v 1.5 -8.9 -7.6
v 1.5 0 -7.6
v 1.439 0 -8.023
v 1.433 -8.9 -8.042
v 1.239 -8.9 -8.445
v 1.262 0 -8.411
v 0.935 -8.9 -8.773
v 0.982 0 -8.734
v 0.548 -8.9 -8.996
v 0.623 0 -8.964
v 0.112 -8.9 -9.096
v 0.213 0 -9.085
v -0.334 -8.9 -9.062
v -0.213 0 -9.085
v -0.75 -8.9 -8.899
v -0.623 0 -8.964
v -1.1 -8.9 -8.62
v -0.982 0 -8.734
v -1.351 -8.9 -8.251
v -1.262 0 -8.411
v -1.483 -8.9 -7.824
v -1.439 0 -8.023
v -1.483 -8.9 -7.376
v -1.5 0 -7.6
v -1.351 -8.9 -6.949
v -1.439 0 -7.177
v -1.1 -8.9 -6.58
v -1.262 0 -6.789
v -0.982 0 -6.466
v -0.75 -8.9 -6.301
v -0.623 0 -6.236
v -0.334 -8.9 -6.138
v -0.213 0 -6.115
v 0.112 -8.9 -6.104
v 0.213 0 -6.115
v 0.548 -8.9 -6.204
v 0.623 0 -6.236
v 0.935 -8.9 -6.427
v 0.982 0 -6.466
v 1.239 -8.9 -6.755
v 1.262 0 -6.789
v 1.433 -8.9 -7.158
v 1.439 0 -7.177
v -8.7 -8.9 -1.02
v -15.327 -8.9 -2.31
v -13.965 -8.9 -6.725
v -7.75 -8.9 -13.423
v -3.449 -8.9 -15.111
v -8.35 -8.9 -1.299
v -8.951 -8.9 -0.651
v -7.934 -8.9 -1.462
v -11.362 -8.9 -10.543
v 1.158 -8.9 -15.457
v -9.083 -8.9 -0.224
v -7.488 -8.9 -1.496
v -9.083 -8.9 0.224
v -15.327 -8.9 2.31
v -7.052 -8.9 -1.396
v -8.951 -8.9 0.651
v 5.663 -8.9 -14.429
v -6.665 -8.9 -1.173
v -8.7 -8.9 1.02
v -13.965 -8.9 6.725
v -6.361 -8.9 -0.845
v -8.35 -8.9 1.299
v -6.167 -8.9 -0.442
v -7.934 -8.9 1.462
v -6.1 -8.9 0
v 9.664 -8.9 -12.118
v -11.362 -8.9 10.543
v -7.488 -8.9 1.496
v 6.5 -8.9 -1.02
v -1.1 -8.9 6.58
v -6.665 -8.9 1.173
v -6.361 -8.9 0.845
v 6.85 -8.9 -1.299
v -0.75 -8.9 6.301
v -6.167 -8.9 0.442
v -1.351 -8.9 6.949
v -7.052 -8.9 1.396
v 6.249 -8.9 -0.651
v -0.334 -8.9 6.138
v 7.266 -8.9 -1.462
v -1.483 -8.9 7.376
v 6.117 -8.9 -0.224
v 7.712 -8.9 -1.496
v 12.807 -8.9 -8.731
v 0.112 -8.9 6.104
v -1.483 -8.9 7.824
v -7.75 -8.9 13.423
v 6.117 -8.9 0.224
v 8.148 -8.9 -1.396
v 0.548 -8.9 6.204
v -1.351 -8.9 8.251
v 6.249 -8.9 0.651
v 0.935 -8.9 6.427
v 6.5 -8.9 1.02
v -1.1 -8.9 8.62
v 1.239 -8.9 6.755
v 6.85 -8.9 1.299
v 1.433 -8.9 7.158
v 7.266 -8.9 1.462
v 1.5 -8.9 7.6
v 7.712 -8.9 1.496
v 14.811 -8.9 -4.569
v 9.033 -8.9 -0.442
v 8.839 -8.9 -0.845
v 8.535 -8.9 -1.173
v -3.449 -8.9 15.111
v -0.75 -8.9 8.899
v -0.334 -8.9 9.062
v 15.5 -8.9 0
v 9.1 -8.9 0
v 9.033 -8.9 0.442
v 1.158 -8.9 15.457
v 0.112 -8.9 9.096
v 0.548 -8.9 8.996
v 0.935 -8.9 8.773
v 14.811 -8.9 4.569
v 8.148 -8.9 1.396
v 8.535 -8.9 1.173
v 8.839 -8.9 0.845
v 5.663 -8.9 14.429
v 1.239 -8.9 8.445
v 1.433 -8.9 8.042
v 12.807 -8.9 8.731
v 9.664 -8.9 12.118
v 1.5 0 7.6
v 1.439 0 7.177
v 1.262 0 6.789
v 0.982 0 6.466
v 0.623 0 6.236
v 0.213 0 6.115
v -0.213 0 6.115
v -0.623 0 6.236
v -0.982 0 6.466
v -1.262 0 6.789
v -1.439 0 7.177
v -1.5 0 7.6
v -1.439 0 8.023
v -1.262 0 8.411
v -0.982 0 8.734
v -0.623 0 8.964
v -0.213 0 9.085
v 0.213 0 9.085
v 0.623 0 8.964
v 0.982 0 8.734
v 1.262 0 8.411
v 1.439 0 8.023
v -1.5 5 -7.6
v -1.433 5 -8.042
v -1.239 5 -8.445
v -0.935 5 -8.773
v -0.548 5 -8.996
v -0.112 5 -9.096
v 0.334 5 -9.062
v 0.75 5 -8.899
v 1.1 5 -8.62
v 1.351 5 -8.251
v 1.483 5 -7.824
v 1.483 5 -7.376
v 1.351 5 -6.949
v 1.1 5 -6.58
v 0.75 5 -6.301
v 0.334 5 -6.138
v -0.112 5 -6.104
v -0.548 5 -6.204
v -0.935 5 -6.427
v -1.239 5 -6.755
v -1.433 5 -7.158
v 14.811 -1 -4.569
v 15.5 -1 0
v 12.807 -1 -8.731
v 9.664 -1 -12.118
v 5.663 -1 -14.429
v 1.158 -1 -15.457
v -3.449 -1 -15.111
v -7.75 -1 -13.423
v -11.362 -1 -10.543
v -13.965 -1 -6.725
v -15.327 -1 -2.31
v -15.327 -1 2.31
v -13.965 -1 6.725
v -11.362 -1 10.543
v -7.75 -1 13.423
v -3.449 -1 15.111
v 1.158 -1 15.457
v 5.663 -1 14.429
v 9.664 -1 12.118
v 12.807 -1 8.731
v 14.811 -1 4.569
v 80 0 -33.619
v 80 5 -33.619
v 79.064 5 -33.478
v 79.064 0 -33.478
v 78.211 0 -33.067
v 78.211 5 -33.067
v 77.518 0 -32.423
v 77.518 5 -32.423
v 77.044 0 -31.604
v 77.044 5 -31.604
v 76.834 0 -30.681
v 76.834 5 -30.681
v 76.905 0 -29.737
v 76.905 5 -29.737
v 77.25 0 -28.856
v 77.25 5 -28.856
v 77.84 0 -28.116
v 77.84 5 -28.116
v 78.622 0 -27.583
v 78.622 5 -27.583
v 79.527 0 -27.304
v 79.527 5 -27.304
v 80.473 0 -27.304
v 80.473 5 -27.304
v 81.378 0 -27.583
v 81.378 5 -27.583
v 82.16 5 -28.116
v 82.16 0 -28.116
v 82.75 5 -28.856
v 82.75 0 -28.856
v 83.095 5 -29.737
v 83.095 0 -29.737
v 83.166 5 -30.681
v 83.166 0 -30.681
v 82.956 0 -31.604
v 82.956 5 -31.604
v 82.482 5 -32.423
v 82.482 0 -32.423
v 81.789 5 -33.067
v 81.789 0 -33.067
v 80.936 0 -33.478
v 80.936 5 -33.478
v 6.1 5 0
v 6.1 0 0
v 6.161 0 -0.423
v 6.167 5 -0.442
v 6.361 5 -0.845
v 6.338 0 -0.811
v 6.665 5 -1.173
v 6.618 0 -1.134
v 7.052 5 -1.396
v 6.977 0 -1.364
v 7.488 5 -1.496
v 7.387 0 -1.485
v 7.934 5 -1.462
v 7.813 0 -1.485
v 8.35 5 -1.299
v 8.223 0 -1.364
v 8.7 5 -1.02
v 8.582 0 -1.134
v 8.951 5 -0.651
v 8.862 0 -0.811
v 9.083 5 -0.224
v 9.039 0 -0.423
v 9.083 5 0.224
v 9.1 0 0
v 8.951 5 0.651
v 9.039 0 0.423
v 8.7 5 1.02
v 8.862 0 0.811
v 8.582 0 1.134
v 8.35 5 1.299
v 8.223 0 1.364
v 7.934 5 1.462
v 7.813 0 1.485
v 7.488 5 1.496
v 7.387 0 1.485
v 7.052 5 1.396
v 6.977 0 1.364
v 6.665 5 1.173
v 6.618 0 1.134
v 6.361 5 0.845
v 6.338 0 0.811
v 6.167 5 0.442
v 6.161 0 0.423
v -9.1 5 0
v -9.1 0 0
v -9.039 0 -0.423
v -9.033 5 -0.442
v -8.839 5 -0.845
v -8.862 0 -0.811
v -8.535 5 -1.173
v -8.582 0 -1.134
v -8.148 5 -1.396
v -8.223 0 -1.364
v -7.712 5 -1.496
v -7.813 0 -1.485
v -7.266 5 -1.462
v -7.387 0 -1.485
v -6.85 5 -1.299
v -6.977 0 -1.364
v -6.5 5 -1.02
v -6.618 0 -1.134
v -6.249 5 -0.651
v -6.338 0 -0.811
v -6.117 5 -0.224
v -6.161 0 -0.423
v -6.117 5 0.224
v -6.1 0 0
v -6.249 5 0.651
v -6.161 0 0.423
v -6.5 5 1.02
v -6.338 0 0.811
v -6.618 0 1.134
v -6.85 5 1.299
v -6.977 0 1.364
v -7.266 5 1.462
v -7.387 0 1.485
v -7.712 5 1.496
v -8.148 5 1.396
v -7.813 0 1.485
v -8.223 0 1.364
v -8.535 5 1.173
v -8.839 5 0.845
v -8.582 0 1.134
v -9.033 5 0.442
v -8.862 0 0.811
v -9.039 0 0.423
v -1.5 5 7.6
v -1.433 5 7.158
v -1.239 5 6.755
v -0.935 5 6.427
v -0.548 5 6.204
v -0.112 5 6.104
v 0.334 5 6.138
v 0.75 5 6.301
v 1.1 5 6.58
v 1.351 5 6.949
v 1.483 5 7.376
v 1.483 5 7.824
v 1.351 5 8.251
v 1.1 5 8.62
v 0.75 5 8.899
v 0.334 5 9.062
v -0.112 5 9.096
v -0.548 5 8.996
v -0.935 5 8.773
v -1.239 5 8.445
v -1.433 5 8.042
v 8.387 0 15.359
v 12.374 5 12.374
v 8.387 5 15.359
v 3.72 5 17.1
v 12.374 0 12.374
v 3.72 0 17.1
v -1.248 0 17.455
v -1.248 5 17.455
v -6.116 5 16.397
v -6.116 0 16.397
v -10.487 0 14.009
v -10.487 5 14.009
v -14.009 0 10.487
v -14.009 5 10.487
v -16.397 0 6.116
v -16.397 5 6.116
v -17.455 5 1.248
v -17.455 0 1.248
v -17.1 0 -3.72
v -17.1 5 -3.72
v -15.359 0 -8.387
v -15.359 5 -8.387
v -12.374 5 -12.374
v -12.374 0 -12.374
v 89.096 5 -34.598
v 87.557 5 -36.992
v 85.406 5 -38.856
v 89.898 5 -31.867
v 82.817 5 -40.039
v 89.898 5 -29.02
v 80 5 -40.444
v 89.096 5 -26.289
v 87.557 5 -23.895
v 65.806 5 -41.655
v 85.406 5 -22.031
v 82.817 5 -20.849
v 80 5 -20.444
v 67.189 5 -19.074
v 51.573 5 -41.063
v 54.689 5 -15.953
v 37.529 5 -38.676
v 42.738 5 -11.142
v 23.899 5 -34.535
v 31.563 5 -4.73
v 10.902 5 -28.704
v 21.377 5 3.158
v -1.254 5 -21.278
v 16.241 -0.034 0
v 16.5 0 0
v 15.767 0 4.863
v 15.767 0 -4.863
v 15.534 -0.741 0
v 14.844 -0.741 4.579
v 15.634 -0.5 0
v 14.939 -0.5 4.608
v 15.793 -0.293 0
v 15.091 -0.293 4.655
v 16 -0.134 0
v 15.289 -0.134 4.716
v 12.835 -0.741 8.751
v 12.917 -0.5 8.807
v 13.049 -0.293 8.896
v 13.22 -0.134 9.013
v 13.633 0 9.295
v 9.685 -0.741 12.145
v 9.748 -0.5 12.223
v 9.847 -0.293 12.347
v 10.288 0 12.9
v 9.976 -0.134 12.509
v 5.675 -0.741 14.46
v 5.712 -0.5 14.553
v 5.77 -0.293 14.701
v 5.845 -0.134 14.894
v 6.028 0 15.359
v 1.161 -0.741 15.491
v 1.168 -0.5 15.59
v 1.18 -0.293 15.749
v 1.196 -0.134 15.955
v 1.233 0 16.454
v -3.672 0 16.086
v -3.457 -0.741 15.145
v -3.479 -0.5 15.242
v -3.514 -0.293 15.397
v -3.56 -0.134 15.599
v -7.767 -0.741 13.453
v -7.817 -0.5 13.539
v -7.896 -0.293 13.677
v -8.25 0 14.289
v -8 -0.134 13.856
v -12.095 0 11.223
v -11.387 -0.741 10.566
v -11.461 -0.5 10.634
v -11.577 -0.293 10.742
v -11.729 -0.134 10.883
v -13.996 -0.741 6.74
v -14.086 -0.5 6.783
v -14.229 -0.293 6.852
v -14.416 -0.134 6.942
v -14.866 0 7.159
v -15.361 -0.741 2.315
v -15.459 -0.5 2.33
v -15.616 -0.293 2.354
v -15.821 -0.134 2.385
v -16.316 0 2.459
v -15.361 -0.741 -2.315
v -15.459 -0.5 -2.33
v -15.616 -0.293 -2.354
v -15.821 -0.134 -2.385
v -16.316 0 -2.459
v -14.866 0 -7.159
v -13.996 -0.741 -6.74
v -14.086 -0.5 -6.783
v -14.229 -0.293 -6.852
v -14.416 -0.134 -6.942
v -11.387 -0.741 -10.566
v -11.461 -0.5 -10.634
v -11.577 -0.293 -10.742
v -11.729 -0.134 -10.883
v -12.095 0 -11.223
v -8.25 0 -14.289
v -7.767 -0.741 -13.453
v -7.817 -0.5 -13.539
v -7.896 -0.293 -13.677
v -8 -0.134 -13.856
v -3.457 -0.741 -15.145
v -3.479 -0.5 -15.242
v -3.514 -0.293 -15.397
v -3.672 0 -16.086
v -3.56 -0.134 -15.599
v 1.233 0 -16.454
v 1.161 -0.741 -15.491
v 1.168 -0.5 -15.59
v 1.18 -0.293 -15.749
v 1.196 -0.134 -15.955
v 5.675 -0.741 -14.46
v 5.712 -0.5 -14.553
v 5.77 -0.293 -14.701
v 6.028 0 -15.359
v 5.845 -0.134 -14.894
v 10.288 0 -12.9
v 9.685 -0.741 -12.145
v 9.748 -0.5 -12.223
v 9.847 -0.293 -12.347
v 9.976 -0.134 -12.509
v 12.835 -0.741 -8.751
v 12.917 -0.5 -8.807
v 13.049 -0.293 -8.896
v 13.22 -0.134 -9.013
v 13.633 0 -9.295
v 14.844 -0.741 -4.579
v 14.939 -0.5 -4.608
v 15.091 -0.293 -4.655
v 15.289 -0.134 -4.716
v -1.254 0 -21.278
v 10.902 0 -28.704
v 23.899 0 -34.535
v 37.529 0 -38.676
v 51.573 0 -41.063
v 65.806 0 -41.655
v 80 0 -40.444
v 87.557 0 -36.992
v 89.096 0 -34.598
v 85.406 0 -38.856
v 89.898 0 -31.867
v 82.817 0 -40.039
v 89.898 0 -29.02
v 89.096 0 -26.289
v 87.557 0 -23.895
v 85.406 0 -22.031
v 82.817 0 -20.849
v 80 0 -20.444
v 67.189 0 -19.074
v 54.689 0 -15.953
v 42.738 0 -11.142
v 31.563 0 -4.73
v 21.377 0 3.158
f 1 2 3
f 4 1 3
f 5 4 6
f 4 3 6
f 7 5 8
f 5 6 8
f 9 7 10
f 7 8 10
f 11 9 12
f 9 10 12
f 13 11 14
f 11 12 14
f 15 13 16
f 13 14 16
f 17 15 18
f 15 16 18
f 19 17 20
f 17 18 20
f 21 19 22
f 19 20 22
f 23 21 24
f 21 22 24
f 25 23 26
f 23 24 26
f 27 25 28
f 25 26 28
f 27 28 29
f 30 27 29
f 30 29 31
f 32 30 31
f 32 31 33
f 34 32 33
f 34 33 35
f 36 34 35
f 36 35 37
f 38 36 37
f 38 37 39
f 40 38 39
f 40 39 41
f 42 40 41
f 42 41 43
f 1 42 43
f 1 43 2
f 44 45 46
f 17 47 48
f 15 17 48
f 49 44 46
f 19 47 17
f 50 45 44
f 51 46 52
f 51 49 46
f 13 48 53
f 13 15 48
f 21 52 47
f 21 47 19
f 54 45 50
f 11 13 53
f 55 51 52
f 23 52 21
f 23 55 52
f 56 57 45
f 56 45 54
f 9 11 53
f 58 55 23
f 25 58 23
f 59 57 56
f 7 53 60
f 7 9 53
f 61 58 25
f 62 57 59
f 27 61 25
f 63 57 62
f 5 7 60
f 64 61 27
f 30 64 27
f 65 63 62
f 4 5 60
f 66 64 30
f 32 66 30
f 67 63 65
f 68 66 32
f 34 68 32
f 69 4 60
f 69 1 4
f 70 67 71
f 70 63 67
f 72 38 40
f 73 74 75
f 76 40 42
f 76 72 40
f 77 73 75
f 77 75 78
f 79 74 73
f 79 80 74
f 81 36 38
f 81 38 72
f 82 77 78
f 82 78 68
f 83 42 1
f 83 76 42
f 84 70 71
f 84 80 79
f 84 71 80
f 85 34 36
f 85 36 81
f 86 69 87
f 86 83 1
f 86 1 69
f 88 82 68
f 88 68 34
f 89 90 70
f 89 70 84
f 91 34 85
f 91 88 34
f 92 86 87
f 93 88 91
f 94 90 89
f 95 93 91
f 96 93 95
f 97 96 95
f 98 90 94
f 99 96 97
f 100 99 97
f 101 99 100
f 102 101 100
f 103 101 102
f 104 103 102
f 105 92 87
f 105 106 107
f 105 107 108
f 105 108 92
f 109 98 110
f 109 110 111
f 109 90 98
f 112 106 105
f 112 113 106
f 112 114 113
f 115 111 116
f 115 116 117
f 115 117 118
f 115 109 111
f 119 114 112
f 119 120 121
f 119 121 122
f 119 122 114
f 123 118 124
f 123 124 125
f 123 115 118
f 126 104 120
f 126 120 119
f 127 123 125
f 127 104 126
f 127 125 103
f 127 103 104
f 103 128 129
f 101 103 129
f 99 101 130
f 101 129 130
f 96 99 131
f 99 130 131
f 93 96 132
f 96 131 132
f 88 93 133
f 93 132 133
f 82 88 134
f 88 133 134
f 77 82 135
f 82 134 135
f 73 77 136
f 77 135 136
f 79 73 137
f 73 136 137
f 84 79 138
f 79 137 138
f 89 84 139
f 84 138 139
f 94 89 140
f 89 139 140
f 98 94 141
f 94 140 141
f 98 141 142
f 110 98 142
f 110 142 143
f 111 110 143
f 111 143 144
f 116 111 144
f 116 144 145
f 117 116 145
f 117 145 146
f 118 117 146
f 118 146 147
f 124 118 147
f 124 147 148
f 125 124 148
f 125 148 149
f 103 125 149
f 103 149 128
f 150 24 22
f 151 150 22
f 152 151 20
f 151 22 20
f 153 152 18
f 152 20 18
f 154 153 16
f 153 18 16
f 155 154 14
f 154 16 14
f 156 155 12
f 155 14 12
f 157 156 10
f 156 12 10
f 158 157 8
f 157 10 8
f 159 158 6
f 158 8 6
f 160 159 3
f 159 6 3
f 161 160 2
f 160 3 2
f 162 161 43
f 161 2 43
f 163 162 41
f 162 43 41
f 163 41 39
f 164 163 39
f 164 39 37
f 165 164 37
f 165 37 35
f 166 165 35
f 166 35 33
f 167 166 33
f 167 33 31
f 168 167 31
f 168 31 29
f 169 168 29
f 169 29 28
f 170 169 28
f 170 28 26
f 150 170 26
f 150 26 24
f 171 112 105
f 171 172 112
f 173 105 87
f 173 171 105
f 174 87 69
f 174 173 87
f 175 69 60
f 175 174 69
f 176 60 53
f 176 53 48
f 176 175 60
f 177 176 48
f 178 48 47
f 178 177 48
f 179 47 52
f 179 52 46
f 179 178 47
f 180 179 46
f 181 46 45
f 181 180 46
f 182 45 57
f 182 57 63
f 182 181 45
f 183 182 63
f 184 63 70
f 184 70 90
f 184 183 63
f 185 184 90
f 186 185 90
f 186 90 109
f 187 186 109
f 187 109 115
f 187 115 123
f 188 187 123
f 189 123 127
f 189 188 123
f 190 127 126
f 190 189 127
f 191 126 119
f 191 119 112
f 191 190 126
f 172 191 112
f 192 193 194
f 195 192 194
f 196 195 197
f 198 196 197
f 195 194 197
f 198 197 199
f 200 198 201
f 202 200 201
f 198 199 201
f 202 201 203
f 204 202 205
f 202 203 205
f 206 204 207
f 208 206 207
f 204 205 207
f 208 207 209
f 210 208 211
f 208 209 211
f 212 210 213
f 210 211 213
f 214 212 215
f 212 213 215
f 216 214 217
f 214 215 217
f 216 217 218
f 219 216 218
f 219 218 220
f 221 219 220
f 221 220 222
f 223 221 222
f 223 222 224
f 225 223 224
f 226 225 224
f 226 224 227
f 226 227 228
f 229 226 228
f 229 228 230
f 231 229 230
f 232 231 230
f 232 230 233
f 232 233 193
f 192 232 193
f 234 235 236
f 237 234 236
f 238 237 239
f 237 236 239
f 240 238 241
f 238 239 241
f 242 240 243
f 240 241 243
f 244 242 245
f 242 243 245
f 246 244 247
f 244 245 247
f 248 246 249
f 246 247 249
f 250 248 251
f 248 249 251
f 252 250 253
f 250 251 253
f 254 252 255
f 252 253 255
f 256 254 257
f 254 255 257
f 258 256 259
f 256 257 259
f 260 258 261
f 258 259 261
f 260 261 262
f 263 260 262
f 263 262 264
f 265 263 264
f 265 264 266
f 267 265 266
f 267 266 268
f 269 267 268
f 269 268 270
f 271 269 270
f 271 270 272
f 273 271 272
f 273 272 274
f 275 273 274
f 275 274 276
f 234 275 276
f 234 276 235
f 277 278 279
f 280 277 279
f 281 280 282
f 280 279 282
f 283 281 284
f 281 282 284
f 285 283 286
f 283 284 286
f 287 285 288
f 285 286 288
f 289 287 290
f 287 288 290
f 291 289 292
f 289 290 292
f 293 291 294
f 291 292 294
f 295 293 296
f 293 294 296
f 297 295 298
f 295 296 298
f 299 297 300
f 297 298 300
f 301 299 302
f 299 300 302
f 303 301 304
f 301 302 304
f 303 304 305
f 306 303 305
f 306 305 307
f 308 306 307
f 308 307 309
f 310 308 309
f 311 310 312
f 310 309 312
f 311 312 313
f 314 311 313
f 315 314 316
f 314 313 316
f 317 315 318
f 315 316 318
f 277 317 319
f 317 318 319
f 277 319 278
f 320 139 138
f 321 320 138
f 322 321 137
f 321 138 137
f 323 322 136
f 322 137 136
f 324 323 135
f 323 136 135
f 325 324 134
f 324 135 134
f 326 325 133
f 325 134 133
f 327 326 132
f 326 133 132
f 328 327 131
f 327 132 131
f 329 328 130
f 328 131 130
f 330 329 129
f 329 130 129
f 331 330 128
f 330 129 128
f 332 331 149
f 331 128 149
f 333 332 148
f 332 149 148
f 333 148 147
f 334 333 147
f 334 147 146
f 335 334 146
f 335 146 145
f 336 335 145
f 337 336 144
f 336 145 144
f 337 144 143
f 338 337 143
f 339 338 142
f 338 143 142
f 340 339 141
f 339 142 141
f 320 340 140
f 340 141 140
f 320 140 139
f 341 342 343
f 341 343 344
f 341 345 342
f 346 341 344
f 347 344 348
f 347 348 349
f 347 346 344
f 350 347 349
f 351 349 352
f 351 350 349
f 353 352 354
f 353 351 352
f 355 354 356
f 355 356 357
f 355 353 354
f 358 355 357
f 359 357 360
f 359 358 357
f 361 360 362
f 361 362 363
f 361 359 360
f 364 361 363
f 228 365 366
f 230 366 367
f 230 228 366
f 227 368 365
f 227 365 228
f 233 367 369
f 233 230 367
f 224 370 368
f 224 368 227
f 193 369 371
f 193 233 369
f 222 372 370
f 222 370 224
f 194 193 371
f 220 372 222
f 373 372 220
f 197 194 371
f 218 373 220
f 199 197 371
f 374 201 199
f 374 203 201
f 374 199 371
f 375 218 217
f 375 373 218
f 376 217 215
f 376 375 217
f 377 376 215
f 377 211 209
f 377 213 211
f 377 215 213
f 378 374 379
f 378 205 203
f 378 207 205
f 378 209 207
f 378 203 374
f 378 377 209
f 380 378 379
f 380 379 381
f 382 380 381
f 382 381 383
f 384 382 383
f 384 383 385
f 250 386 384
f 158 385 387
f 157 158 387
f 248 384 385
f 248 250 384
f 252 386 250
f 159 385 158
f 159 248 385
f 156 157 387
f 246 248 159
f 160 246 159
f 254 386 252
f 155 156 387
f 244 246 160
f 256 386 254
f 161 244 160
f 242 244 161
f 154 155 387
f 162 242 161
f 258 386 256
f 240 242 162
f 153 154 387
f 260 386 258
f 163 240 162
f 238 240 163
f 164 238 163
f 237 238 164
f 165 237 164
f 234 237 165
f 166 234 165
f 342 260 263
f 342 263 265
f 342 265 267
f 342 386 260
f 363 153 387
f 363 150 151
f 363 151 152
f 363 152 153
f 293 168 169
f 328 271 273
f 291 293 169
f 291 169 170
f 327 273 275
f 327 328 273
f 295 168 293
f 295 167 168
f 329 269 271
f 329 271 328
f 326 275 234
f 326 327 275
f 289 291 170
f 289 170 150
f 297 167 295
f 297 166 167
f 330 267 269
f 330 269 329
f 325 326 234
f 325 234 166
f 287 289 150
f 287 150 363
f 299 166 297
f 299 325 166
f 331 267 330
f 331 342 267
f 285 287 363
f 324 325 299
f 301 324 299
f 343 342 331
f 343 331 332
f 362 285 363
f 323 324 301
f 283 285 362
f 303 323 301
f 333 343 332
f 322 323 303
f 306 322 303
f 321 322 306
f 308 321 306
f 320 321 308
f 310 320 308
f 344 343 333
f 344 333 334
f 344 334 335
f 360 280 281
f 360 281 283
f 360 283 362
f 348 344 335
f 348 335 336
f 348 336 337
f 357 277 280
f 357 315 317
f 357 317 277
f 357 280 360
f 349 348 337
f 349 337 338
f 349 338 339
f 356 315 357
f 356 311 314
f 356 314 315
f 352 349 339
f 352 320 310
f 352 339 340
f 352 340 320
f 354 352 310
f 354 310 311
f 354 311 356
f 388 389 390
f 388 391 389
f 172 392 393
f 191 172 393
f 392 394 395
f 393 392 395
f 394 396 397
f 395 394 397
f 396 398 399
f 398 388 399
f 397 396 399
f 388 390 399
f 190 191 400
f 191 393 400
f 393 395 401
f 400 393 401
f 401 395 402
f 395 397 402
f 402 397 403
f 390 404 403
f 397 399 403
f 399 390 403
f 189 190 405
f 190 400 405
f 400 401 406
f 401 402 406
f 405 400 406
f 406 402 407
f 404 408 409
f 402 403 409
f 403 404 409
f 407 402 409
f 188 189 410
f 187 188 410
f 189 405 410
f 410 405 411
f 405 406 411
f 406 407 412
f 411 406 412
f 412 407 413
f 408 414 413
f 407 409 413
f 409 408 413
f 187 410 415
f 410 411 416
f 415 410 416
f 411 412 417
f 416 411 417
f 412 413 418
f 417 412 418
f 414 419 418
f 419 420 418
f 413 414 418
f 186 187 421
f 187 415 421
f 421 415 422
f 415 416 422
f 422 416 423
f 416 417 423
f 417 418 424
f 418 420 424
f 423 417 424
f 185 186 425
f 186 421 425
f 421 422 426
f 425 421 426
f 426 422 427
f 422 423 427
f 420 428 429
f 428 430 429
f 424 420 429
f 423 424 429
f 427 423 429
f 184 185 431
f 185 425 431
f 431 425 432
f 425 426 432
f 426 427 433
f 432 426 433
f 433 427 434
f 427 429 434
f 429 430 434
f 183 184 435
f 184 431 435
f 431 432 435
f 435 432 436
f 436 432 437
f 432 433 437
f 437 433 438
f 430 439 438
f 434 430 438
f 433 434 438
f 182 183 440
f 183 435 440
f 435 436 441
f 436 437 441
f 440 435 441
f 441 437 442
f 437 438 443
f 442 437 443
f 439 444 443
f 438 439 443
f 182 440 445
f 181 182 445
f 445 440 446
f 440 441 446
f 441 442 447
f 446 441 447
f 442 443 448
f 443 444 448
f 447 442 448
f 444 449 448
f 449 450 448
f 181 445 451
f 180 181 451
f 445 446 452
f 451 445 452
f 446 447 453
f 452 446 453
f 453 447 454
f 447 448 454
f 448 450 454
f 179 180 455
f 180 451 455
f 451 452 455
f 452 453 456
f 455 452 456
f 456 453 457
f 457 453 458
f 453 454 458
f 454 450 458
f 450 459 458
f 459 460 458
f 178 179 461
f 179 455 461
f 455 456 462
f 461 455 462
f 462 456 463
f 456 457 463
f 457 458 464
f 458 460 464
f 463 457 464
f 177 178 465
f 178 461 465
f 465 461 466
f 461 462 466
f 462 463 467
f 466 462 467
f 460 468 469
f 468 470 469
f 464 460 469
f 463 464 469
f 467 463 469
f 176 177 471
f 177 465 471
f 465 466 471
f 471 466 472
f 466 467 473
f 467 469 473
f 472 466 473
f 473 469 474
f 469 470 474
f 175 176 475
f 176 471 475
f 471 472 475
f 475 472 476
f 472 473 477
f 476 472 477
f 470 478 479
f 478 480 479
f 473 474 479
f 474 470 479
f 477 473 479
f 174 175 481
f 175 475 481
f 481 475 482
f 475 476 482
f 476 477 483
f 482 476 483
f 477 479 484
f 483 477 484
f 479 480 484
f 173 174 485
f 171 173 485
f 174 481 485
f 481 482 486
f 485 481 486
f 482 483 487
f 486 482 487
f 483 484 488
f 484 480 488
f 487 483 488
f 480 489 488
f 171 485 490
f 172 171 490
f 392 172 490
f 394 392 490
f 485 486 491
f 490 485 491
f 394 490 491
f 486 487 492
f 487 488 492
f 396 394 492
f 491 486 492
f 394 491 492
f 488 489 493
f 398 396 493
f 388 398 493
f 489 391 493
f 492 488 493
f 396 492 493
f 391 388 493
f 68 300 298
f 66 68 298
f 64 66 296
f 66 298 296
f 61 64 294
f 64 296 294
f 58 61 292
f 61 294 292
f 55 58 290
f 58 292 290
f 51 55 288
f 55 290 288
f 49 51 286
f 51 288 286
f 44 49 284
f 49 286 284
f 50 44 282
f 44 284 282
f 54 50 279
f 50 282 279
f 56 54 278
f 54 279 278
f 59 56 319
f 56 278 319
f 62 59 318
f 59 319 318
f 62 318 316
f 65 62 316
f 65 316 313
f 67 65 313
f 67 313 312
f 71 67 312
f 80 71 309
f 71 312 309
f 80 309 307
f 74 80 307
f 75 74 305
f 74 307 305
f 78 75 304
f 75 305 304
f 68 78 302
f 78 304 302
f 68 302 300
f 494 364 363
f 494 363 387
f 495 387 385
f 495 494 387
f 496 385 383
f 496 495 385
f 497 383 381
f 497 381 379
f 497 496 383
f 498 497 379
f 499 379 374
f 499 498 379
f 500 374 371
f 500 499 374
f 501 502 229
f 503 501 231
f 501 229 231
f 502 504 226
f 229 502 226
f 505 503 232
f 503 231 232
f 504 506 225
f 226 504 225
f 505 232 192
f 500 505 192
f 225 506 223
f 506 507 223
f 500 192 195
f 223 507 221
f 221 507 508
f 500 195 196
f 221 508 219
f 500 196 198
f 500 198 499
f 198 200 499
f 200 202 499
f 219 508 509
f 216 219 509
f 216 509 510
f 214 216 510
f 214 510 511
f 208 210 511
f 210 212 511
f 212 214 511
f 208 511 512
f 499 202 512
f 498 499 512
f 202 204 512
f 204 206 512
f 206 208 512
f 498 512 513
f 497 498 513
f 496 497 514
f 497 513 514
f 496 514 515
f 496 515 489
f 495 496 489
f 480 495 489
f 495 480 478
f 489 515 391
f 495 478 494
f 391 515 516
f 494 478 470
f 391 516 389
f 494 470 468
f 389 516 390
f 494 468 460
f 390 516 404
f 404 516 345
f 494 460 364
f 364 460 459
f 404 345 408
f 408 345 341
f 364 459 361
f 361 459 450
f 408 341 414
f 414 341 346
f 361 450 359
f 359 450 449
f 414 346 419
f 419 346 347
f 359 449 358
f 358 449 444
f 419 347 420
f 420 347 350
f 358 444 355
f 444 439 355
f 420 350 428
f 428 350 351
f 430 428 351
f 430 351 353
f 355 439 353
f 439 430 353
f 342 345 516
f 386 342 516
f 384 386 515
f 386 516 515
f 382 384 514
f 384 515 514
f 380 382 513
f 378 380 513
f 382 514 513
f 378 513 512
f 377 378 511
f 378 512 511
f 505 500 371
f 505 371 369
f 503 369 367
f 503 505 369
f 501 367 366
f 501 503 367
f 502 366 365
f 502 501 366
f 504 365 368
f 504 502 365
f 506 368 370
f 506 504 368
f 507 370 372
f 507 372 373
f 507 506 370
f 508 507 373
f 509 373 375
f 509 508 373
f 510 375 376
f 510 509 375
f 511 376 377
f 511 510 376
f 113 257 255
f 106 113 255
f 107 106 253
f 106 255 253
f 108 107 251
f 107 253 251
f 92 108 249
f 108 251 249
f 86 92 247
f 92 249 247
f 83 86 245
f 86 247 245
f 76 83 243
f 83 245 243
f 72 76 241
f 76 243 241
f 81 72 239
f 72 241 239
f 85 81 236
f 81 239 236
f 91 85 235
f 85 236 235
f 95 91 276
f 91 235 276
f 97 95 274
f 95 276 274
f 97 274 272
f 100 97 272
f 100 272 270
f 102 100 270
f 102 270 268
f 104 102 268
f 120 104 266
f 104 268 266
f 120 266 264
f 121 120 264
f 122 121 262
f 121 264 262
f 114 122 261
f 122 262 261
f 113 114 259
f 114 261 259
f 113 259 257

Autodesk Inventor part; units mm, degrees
ref_plane "YZ Plane" through (0, 0, 0) normal (1, 0, 0) x (0, 1, 0)
ref_plane "XZ Plane" through (0, 0, 0) normal (0, 1, 0) x (-1, 0, 0)
ref_plane "XY Plane" through (0, 0, 0) normal (0, 0, 1) x (1, 0, 0)
sketch "Cara" plane through (0, 0, 0) normal (0, 0, 1) x (1, 0, 0)
  line L0 (-22.1935, -24.9393) -> (-15.1747, -17.9205)
  arc A0 (-12.474, -17.8034) -> (-15.1747, -17.9205) centre (-13.7605, -19.3347) ccw
  arc A1 (-12.474, -17.8034) -> (-6.107, -21.4794) centre (1.0981, -1.6477) ccw
  arc A2 (-4.8581, -23.8768) -> (-6.107, -21.4794) centre (-6.79, -23.3592) ccw
  line L1 (-4.8581, -23.8768) -> (-7.4272, -33.4646)
  arc A3 (-9.9928, -34.8439) -> (-7.4272, -33.4646) centre (-9.359, -32.947) ccw
  arc A4 (-22.1052, -27.8509) -> (-9.9928, -34.8439) centre (1.0981, -1.6477) ccw
  arc A5 (-22.1935, -24.9393) -> (-22.1052, -27.8509) centre (-20.7793, -26.3535) ccw
  line L2 (9.6235, -33.4646) -> (7.0544, -23.8768)
  arc A6 (8.3033, -21.4794) -> (7.0544, -23.8768) centre (8.9863, -23.3592) ccw
  arc A7 (8.3033, -21.4794) -> (14.6703, -17.8034) centre (1.0981, -1.6477) ccw
  arc A8 (17.371, -17.9205) -> (14.6703, -17.8034) centre (15.9568, -19.3347) ccw
  line L3 (17.371, -17.9205) -> (24.3898, -24.9393)
  arc A9 (24.3015, -27.8509) -> (24.3898, -24.9393) centre (22.9756, -26.3535) ccw
  arc A10 (12.1891, -34.8439) -> (24.3015, -27.8509) centre (1.0981, -1.6477) ccw
  arc A11 (9.6235, -33.4646) -> (12.1891, -34.8439) centre (11.5553, -32.947) ccw
  line L4 (32.9151, -10.173) -> (23.3272, -7.604)
  arc A12 (21.8755, -5.3237) -> (23.3272, -7.604) centre (23.8449, -5.6721) ccw
  arc A13 (21.8755, -5.3237) -> (21.8755, 2.0283) centre (1.0981, -1.6477) ccw
  arc A14 (23.3272, 4.3086) -> (21.8755, 2.0283) centre (23.8449, 2.3767) ccw
  line L5 (23.3272, 4.3086) -> (32.9151, 6.8776)
  arc A15 (35.3924, 5.3454) -> (32.9151, 6.8776) centre (33.4327, 4.9458) ccw
  arc A16 (35.3924, -8.6408) -> (35.3924, 5.3454) centre (1.0981, -1.6477) ccw
  arc A17 (32.9151, -10.173) -> (35.3924, -8.6408) centre (33.4327, -8.2412) ccw
  line L6 (24.3898, 21.6439) -> (17.371, 14.6251)
  arc A18 (14.6703, 14.508) -> (17.371, 14.6251) centre (15.9568, 16.0394) ccw
  arc A19 (14.6703, 14.508) -> (8.3033, 18.184) centre (1.0981, -1.6477) ccw
  arc A20 (7.0544, 20.5814) -> (8.3033, 18.184) centre (8.9863, 20.0638) ccw
  line L7 (7.0544, 20.5814) -> (9.6235, 30.1693)
  arc A21 (12.1891, 31.5486) -> (9.6235, 30.1693) centre (11.5553, 29.6516) ccw
  arc A22 (24.3015, 24.5555) -> (12.1891, 31.5486) centre (1.0981, -1.6477) ccw
  arc A23 (24.3898, 21.6439) -> (24.3015, 24.5555) centre (22.9756, 23.0582) ccw
  line L8 (-7.4272, 30.1693) -> (-4.8581, 20.5814)
  arc A24 (-6.107, 18.184) -> (-4.8581, 20.5814) centre (-6.79, 20.0638) ccw
  arc A25 (-6.107, 18.184) -> (-12.474, 14.508) centre (1.0981, -1.6477) ccw
  arc A26 (-15.1747, 14.6251) -> (-12.474, 14.508) centre (-13.7605, 16.0394) ccw
  line L9 (-15.1747, 14.6251) -> (-22.1935, 21.6439)
  arc A27 (-22.1052, 24.5555) -> (-22.1935, 21.6439) centre (-20.7793, 23.0582) ccw
  arc A28 (-9.9928, 31.5486) -> (-22.1052, 24.5555) centre (1.0981, -1.6477) ccw
  arc A29 (-7.4272, 30.1693) -> (-9.9928, 31.5486) centre (-9.359, 29.6516) ccw
  line L10 (-30.7188, 6.8776) -> (-21.131, 4.3086)
  arc A30 (-19.6792, 2.0283) -> (-21.131, 4.3086) centre (-21.6486, 2.3767) ccw
  arc A31 (-19.6792, 2.0283) -> (-19.6792, -5.3237) centre (1.0981, -1.6477) ccw
  arc A32 (-21.131, -7.604) -> (-19.6792, -5.3237) centre (-21.6486, -5.6721) ccw
  line L11 (-21.131, -7.604) -> (-30.7188, -10.173)
  arc A33 (-33.1961, -8.6408) -> (-30.7188, -10.173) centre (-31.2365, -8.2412) ccw
  arc A34 (-33.1961, 5.3454) -> (-33.1961, -8.6408) centre (1.0981, -1.6477) ccw
  arc A35 (-30.7188, 6.8776) -> (-33.1961, 5.3454) centre (-31.2365, 4.9458) ccw
  circle A36 centre (-37.4568, -19.3542) radius 1.5875
  circle A37 centre (39.653, 16.0588) radius 1.5875
  circle A38 centre (-16.6083, 36.9072) radius 1.5875
  circle A39 centre (18.8046, -40.2026) radius 1.5875
  circle A40 centre (1.0981, -1.6477) radius 15.5
  arc A41 (13.186, 39.6183) -> (16.9444, 39.4394) centre (15.4349, 47.2957) ccw
  arc A42 (13.186, 39.6183) -> (-10.9897, 39.6183) centre (1.0981, -1.6477) ccw
  arc A43 (-15.0916, 39.5133) -> (-10.9897, 39.6183) centre (-13.2386, 47.2957) ccw
  arc A44 (-15.0916, 39.5133) -> (-19.5734, 37.455) centre (-16.0181, 35.6221) ccw
  arc A45 (-22.3261, 34.412) -> (-19.5734, 37.455) centre (-26.6841, 41.1208) ccw
  arc A46 (-22.3261, 34.412) -> (-34.8255, 21.9848) centre (1.0981, -1.6477) ccw
  arc A47 (-37.5746, 19.4158) -> (-34.8255, 21.9848) centre (-41.5089, 26.3816) ccw
  arc A48 (-39.989, 14.1986) -> (-37.5746, 19.4158) centre (-37.4054, 16.1703) ccw
  arc A49 (-40.1679, 10.4402) -> (-39.989, 14.1986) centre (-47.8453, 12.6891) ccw
  arc A50 (-40.1679, 10.4402) -> (-40.2027, -13.6161) centre (1.0981, -1.6477) ccw
  arc A51 (-40.1338, -17.8165) -> (-40.2027, -13.6161) centre (-47.8865, -15.8428) ccw
  arc A52 (-40.1338, -17.8165) -> (-38.0349, -22.3868) centre (-36.2575, -18.8034) ccw
  arc A53 (-34.8937, -25.1762) -> (-38.0349, -22.3868) centre (-41.5898, -29.5536) ccw
  arc A54 (-34.8937, -25.1762) -> (-22.5344, -37.5713) centre (1.0981, -1.6477) ccw
  arc A55 (-19.9654, -40.3204) -> (-22.5344, -37.5713) centre (-26.9311, -44.2547) ccw
  arc A56 (-14.7481, -42.7348) -> (-19.9654, -40.3204) centre (-16.7198, -40.1512) ccw
  arc A57 (-10.9897, -42.9137) -> (-14.7481, -42.7348) centre (-13.2386, -50.5911) ccw
  arc A58 (-10.9897, -42.9137) -> (13.0666, -42.9485) centre (1.0981, -1.6477) ccw
  arc A59 (17.2235, -42.8687) -> (13.0666, -42.9485) centre (15.2932, -50.6324) ccw
  arc A60 (17.2235, -42.8687) -> (21.7574, -40.7935) centre (18.1887, -38.9869) ccw
  arc A61 (24.5347, -37.6994) -> (21.7574, -40.7935) centre (28.895, -44.4067) ccw
  arc A62 (24.5347, -37.6994) -> (37.0217, -25.2802) centre (1.0981, -1.6477) ccw
  arc A63 (39.7709, -22.7112) -> (37.0217, -25.2802) centre (43.7052, -29.6769) ccw
  arc A64 (42.1093, -17.3982) -> (39.7709, -22.7112) centre (39.6017, -19.4656) ccw
  arc A65 (42.3332, -13.8408) -> (42.1093, -17.3982) centre (50.0048, -16.1093) ccw
  arc A66 (42.3332, -13.8408) -> (42.3989, 10.3207) centre (1.0981, -1.6477) ccw
  arc A67 (42.3301, 14.5211) -> (42.3989, 10.3207) centre (50.0828, 12.5474) ccw
  arc A68 (42.3301, 14.5211) -> (40.2312, 19.0914) centre (38.4538, 15.508) ccw
  arc A69 (37.09, 21.8808) -> (40.2312, 19.0914) centre (43.7861, 26.2582) ccw
  arc A70 (37.09, 21.8808) -> (24.7307, 34.2759) centre (1.0981, -1.6477) ccw
  arc A71 (22.1617, 37.0251) -> (24.7307, 34.2759) centre (29.1274, 40.9594) ccw
  arc A72 (16.9444, 39.4394) -> (22.1617, 37.0251) centre (18.9161, 36.8558) ccw
  arc A73 (-38.8583, 20.9988) -> (-42.0265, 14.1525) centre (-36.2077, 15.616) ccw
  spline S0 degree 3 poles (-40.2504, 14.5992) (-40.3671, 14.8104) (-40.4601, 15.0344) (-40.6458, 15.6766) (-40.6826, 16.1053) (-40.5958, 16.8869) (-40.4968, 17.2357) (-40.1864, 17.8912) (-39.9757, 18.1925) (-39.4148, 18.7612) (-39.0515, 19.0059) (-38.4565, 19.2528) (-38.255, 19.3143) (-38.0493, 19.3558) knots 0 0 0 0 0.118944 0.118944 0.328096 0.328096 0.504735 0.504735 0.683825 0.683825 0.89662 0.89662 1 1 1 1
  line L12 (-38.8583, 20.9988) -> (-38.0493, 19.3558)
  arc A74 (-38.8583, 20.9988) -> (-42.0265, 14.1525) centre (-36.2077, 15.616) ccw
  line L13 (-40.2504, 14.5992) -> (-42.0265, 14.1525)
  line L14 (-38.5582, 21.1573) -> (-37.5746, 19.4158)
  arc A75 (-37.5746, 19.4158) -> (-34.8255, 21.9848) centre (-41.5089, 26.3816) ccw
  line L15 (-36.4963, 23.084) -> (-34.8255, 21.9848)
  arc A76 (-38.5582, 21.1573) -> (-36.4963, 23.084) centre (-41.5089, 26.3816) ccw
  spline S1 degree 3 poles (-38.0493, 19.3558) (-37.9271, 19.3805) (-37.8093, 19.397) (-37.6564, 19.4108) (-37.6155, 19.4137) (-37.5746, 19.4158) knots 0 0 0 0 0.731153 0.731153 1 1 1 1
  line L16 (-38.5582, 21.1573) -> (-37.5746, 19.4158)
  arc A77 (-38.8583, 20.9988) -> (-38.5582, 21.1573) centre (-41.5089, 26.3816) ccw
  line L17 (-38.8583, 20.9988) -> (-38.0493, 19.3558)
  spline S2 degree 3 poles (-39.989, 14.1986) (-40.081, 14.3191) (-40.1695, 14.4526) (-40.2504, 14.5992) knots 0 0 0 0 1 1 1 1
  line L18 (-40.2504, 14.5992) -> (-42.0265, 14.1525)
  arc A78 (-41.953, 13.8212) -> (-42.0265, 14.1525) centre (-47.8453, 12.6891) ccw
  line L19 (-39.989, 14.1986) -> (-41.953, 13.8212)
  line L20 (-39.989, 14.1986) -> (-41.953, 13.8212)
  arc A79 (-42.0872, 11.0024) -> (-41.953, 13.8212) centre (-47.8453, 12.6891) ccw
  line L21 (-42.0872, 11.0024) -> (-40.1679, 10.4402)
  arc A80 (-40.1679, 10.4402) -> (-39.989, 14.1986) centre (-47.8453, 12.6891) ccw
  arc A81 (-42.0872, 11.0024) -> (-42.1236, -14.1728) centre (1.0981, -1.6477) ccw
  line L22 (-36.4963, 23.084) -> (-34.8255, 21.9848)
  arc A82 (-22.3261, 34.412) -> (-34.8255, 21.9848) centre (1.0981, -1.6477) ccw
  line L23 (-23.4156, 36.0892) -> (-22.3261, 34.412)
  arc A83 (-23.4156, 36.0892) -> (-36.4963, 23.084) centre (1.0981, -1.6477) ccw
  line L24 (-23.4156, 36.0892) -> (-22.3261, 34.412)
  arc A84 (-22.3261, 34.412) -> (-19.5734, 37.455) centre (-26.6841, 41.1208) ccw
  line L25 (-21.3511, 38.3714) -> (-19.5734, 37.455)
  arc A85 (-23.4156, 36.0892) -> (-21.3511, 38.3714) centre (-26.6841, 41.1208) ccw
  line L26 (-21.3511, 38.3714) -> (-19.5734, 37.455)
  arc A86 (-15.0916, 39.5133) -> (-19.5734, 37.455) centre (-16.0181, 35.6221) ccw
  line L27 (-14.6284, 41.4589) -> (-15.0916, 39.5133)
  arc A87 (-14.6284, 41.4589) -> (-21.3511, 38.3714) centre (-16.0181, 35.6221) ccw
  line L28 (-14.6284, 41.4589) -> (-15.0916, 39.5133)
  arc A88 (-15.0916, 39.5133) -> (-10.9897, 39.6183) centre (-13.2386, 47.2957) ccw
  line L29 (-11.5519, 41.5377) -> (-10.9897, 39.6183)
  arc A89 (-14.6284, 41.4589) -> (-11.5519, 41.5377) centre (-13.2386, 47.2957) ccw
  line L30 (-11.5519, 41.5377) -> (-10.9897, 39.6183)
  arc A90 (13.186, 39.6183) -> (-10.9897, 39.6183) centre (1.0981, -1.6477) ccw
  line L31 (13.7482, 41.5377) -> (13.186, 39.6183)
  arc A91 (13.7482, 41.5377) -> (-11.5519, 41.5377) centre (1.0981, -1.6477) ccw
  line L32 (16.9444, 39.4394) -> (16.567, 41.4035)
  arc A92 (13.7482, 41.5377) -> (16.567, 41.4035) centre (15.4349, 47.2957) ccw
  line L33 (13.7482, 41.5377) -> (13.186, 39.6183)
  arc A93 (13.186, 39.6183) -> (16.9444, 39.4394) centre (15.4349, 47.2957) ccw
  spline S3 degree 3 poles (16.9444, 39.4394) (17.0649, 39.5314) (17.1985, 39.6199) (17.3451, 39.7009) knots 0 0 0 0 1 1 1 1
  line L34 (17.3451, 39.7009) -> (16.8984, 41.4769)
  arc A94 (16.567, 41.4035) -> (16.8984, 41.4769) centre (15.4349, 47.2957) ccw
  line L35 (16.9444, 39.4394) -> (16.567, 41.4035)
  spline S4 degree 3 poles (17.3451, 39.7009) (17.5563, 39.8175) (17.7803, 39.9105) (18.4224, 40.0962) (18.8512, 40.133) (19.6327, 40.0462) (19.9815, 39.9473) (20.6371, 39.6368) (20.9383, 39.4261) (21.507, 38.8652) (21.7517, 38.502) (21.9986, 37.907) (22.0601, 37.7054) (22.1017, 37.4997) knots 0 0 0 0 0.118944 0.118944 0.328096 0.328096 0.504735 0.504735 0.683825 0.683825 0.89662 0.89662 1 1 1 1
  line L36 (23.7446, 38.3088) -> (22.1017, 37.4997)
  arc A95 (23.7446, 38.3088) -> (16.8984, 41.4769) centre (18.3618, 35.6581) ccw
  line L37 (17.3451, 39.7009) -> (16.8984, 41.4769)
  line L38 (37.09, 21.8808) -> (38.764, 22.9751)
  arc A96 (38.764, 22.9751) -> (25.8298, 35.9468) centre (1.0981, -1.6477) ccw
  line L39 (25.8298, 35.9468) -> (24.7307, 34.2759)
  arc A97 (37.09, 21.8808) -> (24.7307, 34.2759) centre (1.0981, -1.6477) ccw
  line L40 (23.9031, 38.0086) -> (22.1617, 37.0251)
  arc A98 (22.1617, 37.0251) -> (24.7307, 34.2759) centre (29.1274, 40.9594) ccw
  line L41 (25.8298, 35.9468) -> (24.7307, 34.2759)
  arc A99 (23.9031, 38.0086) -> (25.8298, 35.9468) centre (29.1274, 40.9594) ccw
  spline S5 degree 3 poles (22.1017, 37.4997) (22.1264, 37.3775) (22.1428, 37.2598) (22.1566, 37.1069) (22.1595, 37.0659) (22.1617, 37.0251) knots 0 0 0 0 0.731153 0.731153 1 1 1 1
  line L42 (23.9031, 38.0086) -> (22.1617, 37.0251)
  arc A100 (23.7446, 38.3088) -> (23.9031, 38.0086) centre (29.1274, 40.9594) ccw
  line L43 (23.7446, 38.3088) -> (22.1017, 37.4997)
  line L44 (37.09, 21.8808) -> (38.764, 22.9751)
  arc A101 (37.09, 21.8808) -> (40.2312, 19.0914) centre (43.7861, 26.2582) ccw
  line L45 (41.1199, 20.8831) -> (40.2312, 19.0914)
  arc A102 (38.764, 22.9751) -> (41.1199, 20.8831) centre (43.7861, 26.2582) ccw
  line L46 (41.1199, 20.8831) -> (40.2312, 19.0914)
  arc A103 (42.3301, 14.5211) -> (40.2312, 19.0914) centre (38.4538, 15.508) ccw
  line L47 (44.2683, 14.0277) -> (42.3301, 14.5211)
  arc A104 (44.2683, 14.0277) -> (41.1199, 20.8831) centre (38.4538, 15.508) ccw
  line L48 (44.2683, 14.0277) -> (42.3301, 14.5211)
  arc A105 (42.3301, 14.5211) -> (42.3989, 10.3207) centre (50.0828, 12.5474) ccw
  line L49 (44.3199, 10.8774) -> (42.3989, 10.3207)
  arc A106 (44.2683, 14.0277) -> (44.3199, 10.8774) centre (50.0828, 12.5474) ccw
  line L50 (44.3199, 10.8774) -> (42.3989, 10.3207)
  arc A107 (42.3332, -13.8408) -> (42.3989, 10.3207) centre (1.0981, -1.6477) ccw
  line L51 (44.2511, -14.4079) -> (42.3332, -13.8408)
  arc A108 (44.2511, -14.4079) -> (44.3199, 10.8774) centre (1.0981, -1.6477) ccw
  spline S6 degree 3 poles (42.4708, -17.939) (42.66, -18.2947) (42.7816, -18.6826) (42.8764, -19.4825) (42.8492, -19.8873) (42.6667, -20.5952) (42.5369, -20.899) (42.1389, -21.5409) (41.845, -21.8556) (41.1886, -22.3275) (40.8415, -22.494) (40.3834, -22.6216) (40.2925, -22.6427) (40.2009, -22.6599) knots 0 0 0 0 0.198107 0.198107 0.395669 0.395669 0.556952 0.556952 0.766408 0.766408 0.954091 0.954091 1 1 1 1
  line L52 (41.0245, -24.3091) -> (40.2009, -22.6599)
  arc A109 (41.0245, -24.3091) -> (44.1743, -17.5253) centre (38.3438, -18.9413) ccw
  line L53 (42.4708, -17.939) -> (44.1743, -17.5253)
  line L54 (42.1093, -17.3982) -> (44.0832, -17.076)
  arc A110 (44.2511, -14.4079) -> (44.0832, -17.076) centre (50.0048, -16.1093) ccw
  line L55 (44.2511, -14.4079) -> (42.3332, -13.8408)
  arc A111 (42.3332, -13.8408) -> (42.1093, -17.3982) centre (50.0048, -16.1093) ccw
  spline S7 degree 3 poles (42.1093, -17.3982) (42.1251, -17.4173) (42.1406, -17.4367) (42.2692, -17.6002) (42.376, -17.7609) (42.4708, -17.939) knots 0 0 0 0 0.119683 0.119683 1 1 1 1
  line L56 (42.4708, -17.939) -> (44.1743, -17.5253)
  arc A112 (44.0832, -17.076) -> (44.1743, -17.5253) centre (50.0048, -16.1093) ccw
  line L57 (42.1093, -17.3982) -> (44.0832, -17.076)
  spline S8 degree 3 poles (40.2009, -22.6599) (40.0946, -22.6799) (39.9919, -22.6936) (39.8527, -22.7062) (39.8117, -22.7091) (39.7709, -22.7112) knots 0 0 0 0 0.704713 0.704713 1 1 1 1
  line L58 (40.7545, -24.4527) -> (39.7709, -22.7112)
  arc A113 (41.0245, -24.3091) -> (40.7545, -24.4527) centre (43.7052, -29.6769) ccw
  line L59 (41.0245, -24.3091) -> (40.2009, -22.6599)
  line L60 (40.7545, -24.4527) -> (39.7709, -22.7112)
  arc A114 (39.7709, -22.7112) -> (37.0217, -25.2802) centre (43.7052, -29.6769) ccw
  line L61 (38.6926, -26.3794) -> (37.0217, -25.2802)
  arc A115 (40.7545, -24.4527) -> (38.6926, -26.3794) centre (43.7052, -29.6769) ccw
  line L62 (38.6926, -26.3794) -> (37.0217, -25.2802)
  arc A116 (24.5347, -37.6994) -> (37.0217, -25.2802) centre (1.0981, -1.6477) ccw
  line L63 (25.6248, -39.3763) -> (24.5347, -37.6994)
  arc A117 (25.6248, -39.3763) -> (38.6926, -26.3794) centre (1.0981, -1.6477) ccw
  line L64 (25.6248, -39.3763) -> (24.5347, -37.6994)
  arc A118 (24.5347, -37.6994) -> (21.7574, -40.7935) centre (28.895, -44.4067) ccw
  line L65 (23.5418, -41.6968) -> (21.7574, -40.7935)
  arc A119 (25.6248, -39.3763) -> (23.5418, -41.6968) centre (28.895, -44.4067) ccw
  line L66 (23.5418, -41.6968) -> (21.7574, -40.7935)
  arc A120 (17.2235, -42.8687) -> (21.7574, -40.7935) centre (18.1887, -38.9869) ccw
  line L67 (16.7409, -44.8096) -> (17.2235, -42.8687)
  arc A121 (16.7409, -44.8096) -> (23.5418, -41.6968) centre (18.1887, -38.9869) ccw
  line L68 (16.7409, -44.8096) -> (17.2235, -42.8687)
  arc A122 (17.2235, -42.8687) -> (13.0666, -42.9485) centre (15.2932, -50.6324) ccw
  line L69 (13.6232, -44.8695) -> (13.0666, -42.9485)
  arc A123 (16.7409, -44.8096) -> (13.6232, -44.8695) centre (15.2932, -50.6324) ccw
  arc A124 (-10.9897, -42.9137) -> (13.0666, -42.9485) centre (1.0981, -1.6477) ccw
  line L70 (13.6232, -44.8695) -> (13.0666, -42.9485)
  arc A125 (-10.9897, -42.9137) -> (13.0666, -42.9485) centre (1.0981, -1.6477) ccw
  line L71 (-11.5519, -44.8331) -> (-10.9897, -42.9137)
  arc A126 (-11.5519, -44.8331) -> (13.6232, -44.8695) centre (1.0981, -1.6477) ccw
  line L72 (-14.7481, -42.7348) -> (-14.3707, -44.6989)
  arc A127 (-11.5519, -44.8331) -> (-14.3707, -44.6989) centre (-13.2386, -50.5911) ccw
  line L73 (-11.5519, -44.8331) -> (-10.9897, -42.9137)
  arc A128 (-10.9897, -42.9137) -> (-14.7481, -42.7348) centre (-13.2386, -50.5911) ccw
  spline S9 degree 3 poles (-15.1488, -42.9963) (-15.36, -43.1129) (-15.584, -43.2059) (-16.2261, -43.3916) (-16.6549, -43.4284) (-17.4365, -43.3416) (-17.7852, -43.2427) (-18.4408, -42.9322) (-18.742, -42.7215) (-19.3107, -42.1606) (-19.5554, -41.7973) (-19.8023, -41.2024) (-19.8638, -41.0008) (-19.9054, -40.7951) knots 0 0 0 0 0.118944 0.118944 0.328096 0.328096 0.504735 0.504735 0.683825 0.683825 0.89662 0.89662 1 1 1 1
  line L74 (-21.5483, -41.6041) -> (-19.9054, -40.7951)
  arc A129 (-21.5483, -41.6041) -> (-14.7021, -44.7723) centre (-16.1656, -38.9535) ccw
  line L75 (-15.1488, -42.9963) -> (-14.7021, -44.7723)
  spline S10 degree 3 poles (-14.7481, -42.7348) (-14.8686, -42.8268) (-15.0022, -42.9153) (-15.1488, -42.9963) knots 0 0 0 0 1 1 1 1
  line L76 (-15.1488, -42.9963) -> (-14.7021, -44.7723)
  arc A130 (-14.3707, -44.6989) -> (-14.7021, -44.7723) centre (-13.2386, -50.5911) ccw
  line L77 (-14.7481, -42.7348) -> (-14.3707, -44.6989)
  spline S11 degree 3 poles (-19.9054, -40.7951) (-19.9301, -40.6729) (-19.9466, -40.5552) (-19.9604, -40.4023) (-19.9633, -40.3613) (-19.9654, -40.3204) knots 0 0 0 0 0.731153 0.731153 1 1 1 1
  line L78 (-21.7068, -41.304) -> (-19.9654, -40.3204)
  arc A131 (-21.5483, -41.6041) -> (-21.7068, -41.304) centre (-26.9311, -44.2547) ccw
  line L79 (-21.5483, -41.6041) -> (-19.9054, -40.7951)
  circle A132 centre (-16.7198, -40.1512) radius 3.25
  circle A133 centre (-16.7198, -40.1512) radius 1.5875
  circle A134 centre (39.6017, -19.4656) radius 3.25
  circle A135 centre (39.6017, -19.4656) radius 1.5875
  circle A136 centre (18.9161, 36.8558) radius 3.25
  circle A137 centre (18.9161, 36.8558) radius 1.5875
  circle A138 centre (-37.4054, 16.1703) radius 3.25
  circle A139 centre (-37.4054, 16.1703) radius 1.5875
  line L80 (-42.072, -17.3231) -> (-40.1338, -17.8165)
  arc A140 (-40.1338, -17.8165) -> (-40.2027, -13.6161) centre (-47.8865, -15.8428) ccw
  line L81 (-42.1236, -14.1728) -> (-40.2027, -13.6161)
  arc A141 (-42.072, -17.3231) -> (-42.1236, -14.1728) centre (-47.8865, -15.8428) ccw
  line L82 (-38.9237, -24.1785) -> (-38.0349, -22.3868)
  arc A142 (-40.1338, -17.8165) -> (-38.0349, -22.3868) centre (-36.2575, -18.8034) ccw
  line L83 (-42.072, -17.3231) -> (-40.1338, -17.8165)
  arc A143 (-42.072, -17.3231) -> (-38.9237, -24.1785) centre (-36.2575, -18.8034) ccw
  line L84 (-36.5677, -26.2705) -> (-34.8937, -25.1762)
  arc A144 (-34.8937, -25.1762) -> (-38.0349, -22.3868) centre (-41.5898, -29.5536) ccw
  line L85 (-38.9237, -24.1785) -> (-38.0349, -22.3868)
  arc A145 (-36.5677, -26.2705) -> (-38.9237, -24.1785) centre (-41.5898, -29.5536) ccw
  line L86 (-23.6336, -39.2421) -> (-22.5344, -37.5713)
  arc A146 (-34.8937, -25.1762) -> (-22.5344, -37.5713) centre (1.0981, -1.6477) ccw
  line L87 (-36.5677, -26.2705) -> (-34.8937, -25.1762)
  arc A147 (-36.5677, -26.2705) -> (-23.6336, -39.2421) centre (1.0981, -1.6477) ccw
  line L88 (-21.7068, -41.304) -> (-19.9654, -40.3204)
  arc A148 (-19.9654, -40.3204) -> (-22.5344, -37.5713) centre (-26.9311, -44.2547) ccw
  line L89 (-23.6336, -39.2421) -> (-22.5344, -37.5713)
  arc A149 (-21.7068, -41.304) -> (-23.6336, -39.2421) centre (-26.9311, -44.2547) ccw
  point P0 (1.3022, -1.7009)
  dimension "d1" = 30
  dimension "d2" = 40
  dimension "d3" = 70
  dimension "d4" = 90
  dimension "d5" = 65
  dimension "d6" = 95
  dimension "d7" = 100
  dimension "d8" = 72
  dimension "d9" = 17
  dimension "d10" = 110
  dimension "d11" = 4
sketch "Sketch1" plane through (0, 0, 0) normal (0, 1, 0) x (-1, 0, 0)
  line L0 (124.1031, 264.7872) -> (124.1031, -182.5054) construction
  line L1 (124.1031, -182.5054) -> (-344.0995, -182.5054) construction
  line L2 (-344.0995, -182.5054) -> (-344.0995, 264.7872) construction
  line L3 (-344.0995, 264.7872) -> (124.1031, 264.7872) construction
  circle A0 centre (0, 0) radius 50
  circle A1 centre (0, 0) radius 17.5
  line L4 (0, 0) -> (-80, -30.4436)
  line L5 (0, 0) -> (0, -17.5)
  line L6 (0, 0) -> (-17.5, 0)
  circle A2 centre (-80, -30.4436) radius 10
  line L7 (0, 0) -> (12.3744, -12.3744)
  line L8 (-80, -30.4436) -> (-80, -40.4436)
  line L9 (-80, -30.4436) -> (-72.9289, -37.5146)
  arc A3 (-80, -40.4436) -> (12.3744, -12.3744) centre (-63.3574, 70.821) ccw
  line L10 (-80, -30.4436) -> (-80, -20.4436)
  line L11 (0, 0) -> (-12.3744, 12.3744)
  arc A4 (-80, -20.4436) -> (-12.3744, 12.3744) centre (-83.4964, 72.8458) ccw
  circle A5 centre (0, 0) radius 7.6
  circle A6 centre (7.6, 0) radius 1.5
  circle A7 centre (0, 7.6) radius 1.5
  circle A8 centre (-7.6, 0) radius 1.5
  circle A9 centre (0, -7.6) radius 1.5
  circle A10 centre (-80, -30.4436) radius 1.5
  dimension "d68" = 15.2
  dimension "d44" = 100
  dimension "d55" = 35
  dimension "d56" = 80
  dimension "d65" = 20
  dimension "d66" = 45
  dimension "d67" = 45
  dimension "d69" = 3
  dimension "d72" = 360
  dimension "d80" = 3
extrude "Extrusion1" add sketch "Sketch1" along normal blind 5 contours A4 A1 L4 A0 | A0 L4 A2 A4 | A3 A2 L4 A0 | A0 L4 A1 A3 | L10 A10 L8 A2 | A2 L4 A10 L10 | A4 L11 A5 A8 L6 A1 | L8 A10 L9 A2 | A1 L5 A9 A5 L7 A3 | L4 A5 A9 L5 A1 | A1 L6 A8 A5 L4 | A2 L9 A10 L4 | A10 L4 L10 | L10 L8 A10 | A1 L7 A5 A6 A7 L11 | L8 L9 A10 | A5 A8 L6 L4 | L4 L5 A9 A5 | A10 L9 L4 | A5 A7 A6 L7 L11 | L11 L6 A8 A5 | A5 A9 L5 L7
sketch "Sketch2" plane through (0, 0, 0) normal (0, -1, 0) x (1, 0, 0)
  circle A0 centre (0, 0) radius 15.5
  circle A1 centre (-7.6, 0) radius 1.5 projected
  circle A2 centre (0, -7.6) radius 1.5 projected
  circle A3 centre (7.6, 0) radius 1.5 projected
  circle A4 centre (0, 7.6) radius 1.5 projected
  dimension "d77" = 31
extrude "Extrusion2" add sketch "Sketch2" along normal blind 4.9
hole "Hole1" at (80, 0, -30.4436) direction (0, 1, 0) diameter 6.35 end through all
fillet "Fillet1" radius 1 1 edges at (-15.5, 0, 0)
move faces "Move1" translate (0, -4, 0) faces at (6.8404, -4.9, -6.4558)
properties part number "Link1V1"
